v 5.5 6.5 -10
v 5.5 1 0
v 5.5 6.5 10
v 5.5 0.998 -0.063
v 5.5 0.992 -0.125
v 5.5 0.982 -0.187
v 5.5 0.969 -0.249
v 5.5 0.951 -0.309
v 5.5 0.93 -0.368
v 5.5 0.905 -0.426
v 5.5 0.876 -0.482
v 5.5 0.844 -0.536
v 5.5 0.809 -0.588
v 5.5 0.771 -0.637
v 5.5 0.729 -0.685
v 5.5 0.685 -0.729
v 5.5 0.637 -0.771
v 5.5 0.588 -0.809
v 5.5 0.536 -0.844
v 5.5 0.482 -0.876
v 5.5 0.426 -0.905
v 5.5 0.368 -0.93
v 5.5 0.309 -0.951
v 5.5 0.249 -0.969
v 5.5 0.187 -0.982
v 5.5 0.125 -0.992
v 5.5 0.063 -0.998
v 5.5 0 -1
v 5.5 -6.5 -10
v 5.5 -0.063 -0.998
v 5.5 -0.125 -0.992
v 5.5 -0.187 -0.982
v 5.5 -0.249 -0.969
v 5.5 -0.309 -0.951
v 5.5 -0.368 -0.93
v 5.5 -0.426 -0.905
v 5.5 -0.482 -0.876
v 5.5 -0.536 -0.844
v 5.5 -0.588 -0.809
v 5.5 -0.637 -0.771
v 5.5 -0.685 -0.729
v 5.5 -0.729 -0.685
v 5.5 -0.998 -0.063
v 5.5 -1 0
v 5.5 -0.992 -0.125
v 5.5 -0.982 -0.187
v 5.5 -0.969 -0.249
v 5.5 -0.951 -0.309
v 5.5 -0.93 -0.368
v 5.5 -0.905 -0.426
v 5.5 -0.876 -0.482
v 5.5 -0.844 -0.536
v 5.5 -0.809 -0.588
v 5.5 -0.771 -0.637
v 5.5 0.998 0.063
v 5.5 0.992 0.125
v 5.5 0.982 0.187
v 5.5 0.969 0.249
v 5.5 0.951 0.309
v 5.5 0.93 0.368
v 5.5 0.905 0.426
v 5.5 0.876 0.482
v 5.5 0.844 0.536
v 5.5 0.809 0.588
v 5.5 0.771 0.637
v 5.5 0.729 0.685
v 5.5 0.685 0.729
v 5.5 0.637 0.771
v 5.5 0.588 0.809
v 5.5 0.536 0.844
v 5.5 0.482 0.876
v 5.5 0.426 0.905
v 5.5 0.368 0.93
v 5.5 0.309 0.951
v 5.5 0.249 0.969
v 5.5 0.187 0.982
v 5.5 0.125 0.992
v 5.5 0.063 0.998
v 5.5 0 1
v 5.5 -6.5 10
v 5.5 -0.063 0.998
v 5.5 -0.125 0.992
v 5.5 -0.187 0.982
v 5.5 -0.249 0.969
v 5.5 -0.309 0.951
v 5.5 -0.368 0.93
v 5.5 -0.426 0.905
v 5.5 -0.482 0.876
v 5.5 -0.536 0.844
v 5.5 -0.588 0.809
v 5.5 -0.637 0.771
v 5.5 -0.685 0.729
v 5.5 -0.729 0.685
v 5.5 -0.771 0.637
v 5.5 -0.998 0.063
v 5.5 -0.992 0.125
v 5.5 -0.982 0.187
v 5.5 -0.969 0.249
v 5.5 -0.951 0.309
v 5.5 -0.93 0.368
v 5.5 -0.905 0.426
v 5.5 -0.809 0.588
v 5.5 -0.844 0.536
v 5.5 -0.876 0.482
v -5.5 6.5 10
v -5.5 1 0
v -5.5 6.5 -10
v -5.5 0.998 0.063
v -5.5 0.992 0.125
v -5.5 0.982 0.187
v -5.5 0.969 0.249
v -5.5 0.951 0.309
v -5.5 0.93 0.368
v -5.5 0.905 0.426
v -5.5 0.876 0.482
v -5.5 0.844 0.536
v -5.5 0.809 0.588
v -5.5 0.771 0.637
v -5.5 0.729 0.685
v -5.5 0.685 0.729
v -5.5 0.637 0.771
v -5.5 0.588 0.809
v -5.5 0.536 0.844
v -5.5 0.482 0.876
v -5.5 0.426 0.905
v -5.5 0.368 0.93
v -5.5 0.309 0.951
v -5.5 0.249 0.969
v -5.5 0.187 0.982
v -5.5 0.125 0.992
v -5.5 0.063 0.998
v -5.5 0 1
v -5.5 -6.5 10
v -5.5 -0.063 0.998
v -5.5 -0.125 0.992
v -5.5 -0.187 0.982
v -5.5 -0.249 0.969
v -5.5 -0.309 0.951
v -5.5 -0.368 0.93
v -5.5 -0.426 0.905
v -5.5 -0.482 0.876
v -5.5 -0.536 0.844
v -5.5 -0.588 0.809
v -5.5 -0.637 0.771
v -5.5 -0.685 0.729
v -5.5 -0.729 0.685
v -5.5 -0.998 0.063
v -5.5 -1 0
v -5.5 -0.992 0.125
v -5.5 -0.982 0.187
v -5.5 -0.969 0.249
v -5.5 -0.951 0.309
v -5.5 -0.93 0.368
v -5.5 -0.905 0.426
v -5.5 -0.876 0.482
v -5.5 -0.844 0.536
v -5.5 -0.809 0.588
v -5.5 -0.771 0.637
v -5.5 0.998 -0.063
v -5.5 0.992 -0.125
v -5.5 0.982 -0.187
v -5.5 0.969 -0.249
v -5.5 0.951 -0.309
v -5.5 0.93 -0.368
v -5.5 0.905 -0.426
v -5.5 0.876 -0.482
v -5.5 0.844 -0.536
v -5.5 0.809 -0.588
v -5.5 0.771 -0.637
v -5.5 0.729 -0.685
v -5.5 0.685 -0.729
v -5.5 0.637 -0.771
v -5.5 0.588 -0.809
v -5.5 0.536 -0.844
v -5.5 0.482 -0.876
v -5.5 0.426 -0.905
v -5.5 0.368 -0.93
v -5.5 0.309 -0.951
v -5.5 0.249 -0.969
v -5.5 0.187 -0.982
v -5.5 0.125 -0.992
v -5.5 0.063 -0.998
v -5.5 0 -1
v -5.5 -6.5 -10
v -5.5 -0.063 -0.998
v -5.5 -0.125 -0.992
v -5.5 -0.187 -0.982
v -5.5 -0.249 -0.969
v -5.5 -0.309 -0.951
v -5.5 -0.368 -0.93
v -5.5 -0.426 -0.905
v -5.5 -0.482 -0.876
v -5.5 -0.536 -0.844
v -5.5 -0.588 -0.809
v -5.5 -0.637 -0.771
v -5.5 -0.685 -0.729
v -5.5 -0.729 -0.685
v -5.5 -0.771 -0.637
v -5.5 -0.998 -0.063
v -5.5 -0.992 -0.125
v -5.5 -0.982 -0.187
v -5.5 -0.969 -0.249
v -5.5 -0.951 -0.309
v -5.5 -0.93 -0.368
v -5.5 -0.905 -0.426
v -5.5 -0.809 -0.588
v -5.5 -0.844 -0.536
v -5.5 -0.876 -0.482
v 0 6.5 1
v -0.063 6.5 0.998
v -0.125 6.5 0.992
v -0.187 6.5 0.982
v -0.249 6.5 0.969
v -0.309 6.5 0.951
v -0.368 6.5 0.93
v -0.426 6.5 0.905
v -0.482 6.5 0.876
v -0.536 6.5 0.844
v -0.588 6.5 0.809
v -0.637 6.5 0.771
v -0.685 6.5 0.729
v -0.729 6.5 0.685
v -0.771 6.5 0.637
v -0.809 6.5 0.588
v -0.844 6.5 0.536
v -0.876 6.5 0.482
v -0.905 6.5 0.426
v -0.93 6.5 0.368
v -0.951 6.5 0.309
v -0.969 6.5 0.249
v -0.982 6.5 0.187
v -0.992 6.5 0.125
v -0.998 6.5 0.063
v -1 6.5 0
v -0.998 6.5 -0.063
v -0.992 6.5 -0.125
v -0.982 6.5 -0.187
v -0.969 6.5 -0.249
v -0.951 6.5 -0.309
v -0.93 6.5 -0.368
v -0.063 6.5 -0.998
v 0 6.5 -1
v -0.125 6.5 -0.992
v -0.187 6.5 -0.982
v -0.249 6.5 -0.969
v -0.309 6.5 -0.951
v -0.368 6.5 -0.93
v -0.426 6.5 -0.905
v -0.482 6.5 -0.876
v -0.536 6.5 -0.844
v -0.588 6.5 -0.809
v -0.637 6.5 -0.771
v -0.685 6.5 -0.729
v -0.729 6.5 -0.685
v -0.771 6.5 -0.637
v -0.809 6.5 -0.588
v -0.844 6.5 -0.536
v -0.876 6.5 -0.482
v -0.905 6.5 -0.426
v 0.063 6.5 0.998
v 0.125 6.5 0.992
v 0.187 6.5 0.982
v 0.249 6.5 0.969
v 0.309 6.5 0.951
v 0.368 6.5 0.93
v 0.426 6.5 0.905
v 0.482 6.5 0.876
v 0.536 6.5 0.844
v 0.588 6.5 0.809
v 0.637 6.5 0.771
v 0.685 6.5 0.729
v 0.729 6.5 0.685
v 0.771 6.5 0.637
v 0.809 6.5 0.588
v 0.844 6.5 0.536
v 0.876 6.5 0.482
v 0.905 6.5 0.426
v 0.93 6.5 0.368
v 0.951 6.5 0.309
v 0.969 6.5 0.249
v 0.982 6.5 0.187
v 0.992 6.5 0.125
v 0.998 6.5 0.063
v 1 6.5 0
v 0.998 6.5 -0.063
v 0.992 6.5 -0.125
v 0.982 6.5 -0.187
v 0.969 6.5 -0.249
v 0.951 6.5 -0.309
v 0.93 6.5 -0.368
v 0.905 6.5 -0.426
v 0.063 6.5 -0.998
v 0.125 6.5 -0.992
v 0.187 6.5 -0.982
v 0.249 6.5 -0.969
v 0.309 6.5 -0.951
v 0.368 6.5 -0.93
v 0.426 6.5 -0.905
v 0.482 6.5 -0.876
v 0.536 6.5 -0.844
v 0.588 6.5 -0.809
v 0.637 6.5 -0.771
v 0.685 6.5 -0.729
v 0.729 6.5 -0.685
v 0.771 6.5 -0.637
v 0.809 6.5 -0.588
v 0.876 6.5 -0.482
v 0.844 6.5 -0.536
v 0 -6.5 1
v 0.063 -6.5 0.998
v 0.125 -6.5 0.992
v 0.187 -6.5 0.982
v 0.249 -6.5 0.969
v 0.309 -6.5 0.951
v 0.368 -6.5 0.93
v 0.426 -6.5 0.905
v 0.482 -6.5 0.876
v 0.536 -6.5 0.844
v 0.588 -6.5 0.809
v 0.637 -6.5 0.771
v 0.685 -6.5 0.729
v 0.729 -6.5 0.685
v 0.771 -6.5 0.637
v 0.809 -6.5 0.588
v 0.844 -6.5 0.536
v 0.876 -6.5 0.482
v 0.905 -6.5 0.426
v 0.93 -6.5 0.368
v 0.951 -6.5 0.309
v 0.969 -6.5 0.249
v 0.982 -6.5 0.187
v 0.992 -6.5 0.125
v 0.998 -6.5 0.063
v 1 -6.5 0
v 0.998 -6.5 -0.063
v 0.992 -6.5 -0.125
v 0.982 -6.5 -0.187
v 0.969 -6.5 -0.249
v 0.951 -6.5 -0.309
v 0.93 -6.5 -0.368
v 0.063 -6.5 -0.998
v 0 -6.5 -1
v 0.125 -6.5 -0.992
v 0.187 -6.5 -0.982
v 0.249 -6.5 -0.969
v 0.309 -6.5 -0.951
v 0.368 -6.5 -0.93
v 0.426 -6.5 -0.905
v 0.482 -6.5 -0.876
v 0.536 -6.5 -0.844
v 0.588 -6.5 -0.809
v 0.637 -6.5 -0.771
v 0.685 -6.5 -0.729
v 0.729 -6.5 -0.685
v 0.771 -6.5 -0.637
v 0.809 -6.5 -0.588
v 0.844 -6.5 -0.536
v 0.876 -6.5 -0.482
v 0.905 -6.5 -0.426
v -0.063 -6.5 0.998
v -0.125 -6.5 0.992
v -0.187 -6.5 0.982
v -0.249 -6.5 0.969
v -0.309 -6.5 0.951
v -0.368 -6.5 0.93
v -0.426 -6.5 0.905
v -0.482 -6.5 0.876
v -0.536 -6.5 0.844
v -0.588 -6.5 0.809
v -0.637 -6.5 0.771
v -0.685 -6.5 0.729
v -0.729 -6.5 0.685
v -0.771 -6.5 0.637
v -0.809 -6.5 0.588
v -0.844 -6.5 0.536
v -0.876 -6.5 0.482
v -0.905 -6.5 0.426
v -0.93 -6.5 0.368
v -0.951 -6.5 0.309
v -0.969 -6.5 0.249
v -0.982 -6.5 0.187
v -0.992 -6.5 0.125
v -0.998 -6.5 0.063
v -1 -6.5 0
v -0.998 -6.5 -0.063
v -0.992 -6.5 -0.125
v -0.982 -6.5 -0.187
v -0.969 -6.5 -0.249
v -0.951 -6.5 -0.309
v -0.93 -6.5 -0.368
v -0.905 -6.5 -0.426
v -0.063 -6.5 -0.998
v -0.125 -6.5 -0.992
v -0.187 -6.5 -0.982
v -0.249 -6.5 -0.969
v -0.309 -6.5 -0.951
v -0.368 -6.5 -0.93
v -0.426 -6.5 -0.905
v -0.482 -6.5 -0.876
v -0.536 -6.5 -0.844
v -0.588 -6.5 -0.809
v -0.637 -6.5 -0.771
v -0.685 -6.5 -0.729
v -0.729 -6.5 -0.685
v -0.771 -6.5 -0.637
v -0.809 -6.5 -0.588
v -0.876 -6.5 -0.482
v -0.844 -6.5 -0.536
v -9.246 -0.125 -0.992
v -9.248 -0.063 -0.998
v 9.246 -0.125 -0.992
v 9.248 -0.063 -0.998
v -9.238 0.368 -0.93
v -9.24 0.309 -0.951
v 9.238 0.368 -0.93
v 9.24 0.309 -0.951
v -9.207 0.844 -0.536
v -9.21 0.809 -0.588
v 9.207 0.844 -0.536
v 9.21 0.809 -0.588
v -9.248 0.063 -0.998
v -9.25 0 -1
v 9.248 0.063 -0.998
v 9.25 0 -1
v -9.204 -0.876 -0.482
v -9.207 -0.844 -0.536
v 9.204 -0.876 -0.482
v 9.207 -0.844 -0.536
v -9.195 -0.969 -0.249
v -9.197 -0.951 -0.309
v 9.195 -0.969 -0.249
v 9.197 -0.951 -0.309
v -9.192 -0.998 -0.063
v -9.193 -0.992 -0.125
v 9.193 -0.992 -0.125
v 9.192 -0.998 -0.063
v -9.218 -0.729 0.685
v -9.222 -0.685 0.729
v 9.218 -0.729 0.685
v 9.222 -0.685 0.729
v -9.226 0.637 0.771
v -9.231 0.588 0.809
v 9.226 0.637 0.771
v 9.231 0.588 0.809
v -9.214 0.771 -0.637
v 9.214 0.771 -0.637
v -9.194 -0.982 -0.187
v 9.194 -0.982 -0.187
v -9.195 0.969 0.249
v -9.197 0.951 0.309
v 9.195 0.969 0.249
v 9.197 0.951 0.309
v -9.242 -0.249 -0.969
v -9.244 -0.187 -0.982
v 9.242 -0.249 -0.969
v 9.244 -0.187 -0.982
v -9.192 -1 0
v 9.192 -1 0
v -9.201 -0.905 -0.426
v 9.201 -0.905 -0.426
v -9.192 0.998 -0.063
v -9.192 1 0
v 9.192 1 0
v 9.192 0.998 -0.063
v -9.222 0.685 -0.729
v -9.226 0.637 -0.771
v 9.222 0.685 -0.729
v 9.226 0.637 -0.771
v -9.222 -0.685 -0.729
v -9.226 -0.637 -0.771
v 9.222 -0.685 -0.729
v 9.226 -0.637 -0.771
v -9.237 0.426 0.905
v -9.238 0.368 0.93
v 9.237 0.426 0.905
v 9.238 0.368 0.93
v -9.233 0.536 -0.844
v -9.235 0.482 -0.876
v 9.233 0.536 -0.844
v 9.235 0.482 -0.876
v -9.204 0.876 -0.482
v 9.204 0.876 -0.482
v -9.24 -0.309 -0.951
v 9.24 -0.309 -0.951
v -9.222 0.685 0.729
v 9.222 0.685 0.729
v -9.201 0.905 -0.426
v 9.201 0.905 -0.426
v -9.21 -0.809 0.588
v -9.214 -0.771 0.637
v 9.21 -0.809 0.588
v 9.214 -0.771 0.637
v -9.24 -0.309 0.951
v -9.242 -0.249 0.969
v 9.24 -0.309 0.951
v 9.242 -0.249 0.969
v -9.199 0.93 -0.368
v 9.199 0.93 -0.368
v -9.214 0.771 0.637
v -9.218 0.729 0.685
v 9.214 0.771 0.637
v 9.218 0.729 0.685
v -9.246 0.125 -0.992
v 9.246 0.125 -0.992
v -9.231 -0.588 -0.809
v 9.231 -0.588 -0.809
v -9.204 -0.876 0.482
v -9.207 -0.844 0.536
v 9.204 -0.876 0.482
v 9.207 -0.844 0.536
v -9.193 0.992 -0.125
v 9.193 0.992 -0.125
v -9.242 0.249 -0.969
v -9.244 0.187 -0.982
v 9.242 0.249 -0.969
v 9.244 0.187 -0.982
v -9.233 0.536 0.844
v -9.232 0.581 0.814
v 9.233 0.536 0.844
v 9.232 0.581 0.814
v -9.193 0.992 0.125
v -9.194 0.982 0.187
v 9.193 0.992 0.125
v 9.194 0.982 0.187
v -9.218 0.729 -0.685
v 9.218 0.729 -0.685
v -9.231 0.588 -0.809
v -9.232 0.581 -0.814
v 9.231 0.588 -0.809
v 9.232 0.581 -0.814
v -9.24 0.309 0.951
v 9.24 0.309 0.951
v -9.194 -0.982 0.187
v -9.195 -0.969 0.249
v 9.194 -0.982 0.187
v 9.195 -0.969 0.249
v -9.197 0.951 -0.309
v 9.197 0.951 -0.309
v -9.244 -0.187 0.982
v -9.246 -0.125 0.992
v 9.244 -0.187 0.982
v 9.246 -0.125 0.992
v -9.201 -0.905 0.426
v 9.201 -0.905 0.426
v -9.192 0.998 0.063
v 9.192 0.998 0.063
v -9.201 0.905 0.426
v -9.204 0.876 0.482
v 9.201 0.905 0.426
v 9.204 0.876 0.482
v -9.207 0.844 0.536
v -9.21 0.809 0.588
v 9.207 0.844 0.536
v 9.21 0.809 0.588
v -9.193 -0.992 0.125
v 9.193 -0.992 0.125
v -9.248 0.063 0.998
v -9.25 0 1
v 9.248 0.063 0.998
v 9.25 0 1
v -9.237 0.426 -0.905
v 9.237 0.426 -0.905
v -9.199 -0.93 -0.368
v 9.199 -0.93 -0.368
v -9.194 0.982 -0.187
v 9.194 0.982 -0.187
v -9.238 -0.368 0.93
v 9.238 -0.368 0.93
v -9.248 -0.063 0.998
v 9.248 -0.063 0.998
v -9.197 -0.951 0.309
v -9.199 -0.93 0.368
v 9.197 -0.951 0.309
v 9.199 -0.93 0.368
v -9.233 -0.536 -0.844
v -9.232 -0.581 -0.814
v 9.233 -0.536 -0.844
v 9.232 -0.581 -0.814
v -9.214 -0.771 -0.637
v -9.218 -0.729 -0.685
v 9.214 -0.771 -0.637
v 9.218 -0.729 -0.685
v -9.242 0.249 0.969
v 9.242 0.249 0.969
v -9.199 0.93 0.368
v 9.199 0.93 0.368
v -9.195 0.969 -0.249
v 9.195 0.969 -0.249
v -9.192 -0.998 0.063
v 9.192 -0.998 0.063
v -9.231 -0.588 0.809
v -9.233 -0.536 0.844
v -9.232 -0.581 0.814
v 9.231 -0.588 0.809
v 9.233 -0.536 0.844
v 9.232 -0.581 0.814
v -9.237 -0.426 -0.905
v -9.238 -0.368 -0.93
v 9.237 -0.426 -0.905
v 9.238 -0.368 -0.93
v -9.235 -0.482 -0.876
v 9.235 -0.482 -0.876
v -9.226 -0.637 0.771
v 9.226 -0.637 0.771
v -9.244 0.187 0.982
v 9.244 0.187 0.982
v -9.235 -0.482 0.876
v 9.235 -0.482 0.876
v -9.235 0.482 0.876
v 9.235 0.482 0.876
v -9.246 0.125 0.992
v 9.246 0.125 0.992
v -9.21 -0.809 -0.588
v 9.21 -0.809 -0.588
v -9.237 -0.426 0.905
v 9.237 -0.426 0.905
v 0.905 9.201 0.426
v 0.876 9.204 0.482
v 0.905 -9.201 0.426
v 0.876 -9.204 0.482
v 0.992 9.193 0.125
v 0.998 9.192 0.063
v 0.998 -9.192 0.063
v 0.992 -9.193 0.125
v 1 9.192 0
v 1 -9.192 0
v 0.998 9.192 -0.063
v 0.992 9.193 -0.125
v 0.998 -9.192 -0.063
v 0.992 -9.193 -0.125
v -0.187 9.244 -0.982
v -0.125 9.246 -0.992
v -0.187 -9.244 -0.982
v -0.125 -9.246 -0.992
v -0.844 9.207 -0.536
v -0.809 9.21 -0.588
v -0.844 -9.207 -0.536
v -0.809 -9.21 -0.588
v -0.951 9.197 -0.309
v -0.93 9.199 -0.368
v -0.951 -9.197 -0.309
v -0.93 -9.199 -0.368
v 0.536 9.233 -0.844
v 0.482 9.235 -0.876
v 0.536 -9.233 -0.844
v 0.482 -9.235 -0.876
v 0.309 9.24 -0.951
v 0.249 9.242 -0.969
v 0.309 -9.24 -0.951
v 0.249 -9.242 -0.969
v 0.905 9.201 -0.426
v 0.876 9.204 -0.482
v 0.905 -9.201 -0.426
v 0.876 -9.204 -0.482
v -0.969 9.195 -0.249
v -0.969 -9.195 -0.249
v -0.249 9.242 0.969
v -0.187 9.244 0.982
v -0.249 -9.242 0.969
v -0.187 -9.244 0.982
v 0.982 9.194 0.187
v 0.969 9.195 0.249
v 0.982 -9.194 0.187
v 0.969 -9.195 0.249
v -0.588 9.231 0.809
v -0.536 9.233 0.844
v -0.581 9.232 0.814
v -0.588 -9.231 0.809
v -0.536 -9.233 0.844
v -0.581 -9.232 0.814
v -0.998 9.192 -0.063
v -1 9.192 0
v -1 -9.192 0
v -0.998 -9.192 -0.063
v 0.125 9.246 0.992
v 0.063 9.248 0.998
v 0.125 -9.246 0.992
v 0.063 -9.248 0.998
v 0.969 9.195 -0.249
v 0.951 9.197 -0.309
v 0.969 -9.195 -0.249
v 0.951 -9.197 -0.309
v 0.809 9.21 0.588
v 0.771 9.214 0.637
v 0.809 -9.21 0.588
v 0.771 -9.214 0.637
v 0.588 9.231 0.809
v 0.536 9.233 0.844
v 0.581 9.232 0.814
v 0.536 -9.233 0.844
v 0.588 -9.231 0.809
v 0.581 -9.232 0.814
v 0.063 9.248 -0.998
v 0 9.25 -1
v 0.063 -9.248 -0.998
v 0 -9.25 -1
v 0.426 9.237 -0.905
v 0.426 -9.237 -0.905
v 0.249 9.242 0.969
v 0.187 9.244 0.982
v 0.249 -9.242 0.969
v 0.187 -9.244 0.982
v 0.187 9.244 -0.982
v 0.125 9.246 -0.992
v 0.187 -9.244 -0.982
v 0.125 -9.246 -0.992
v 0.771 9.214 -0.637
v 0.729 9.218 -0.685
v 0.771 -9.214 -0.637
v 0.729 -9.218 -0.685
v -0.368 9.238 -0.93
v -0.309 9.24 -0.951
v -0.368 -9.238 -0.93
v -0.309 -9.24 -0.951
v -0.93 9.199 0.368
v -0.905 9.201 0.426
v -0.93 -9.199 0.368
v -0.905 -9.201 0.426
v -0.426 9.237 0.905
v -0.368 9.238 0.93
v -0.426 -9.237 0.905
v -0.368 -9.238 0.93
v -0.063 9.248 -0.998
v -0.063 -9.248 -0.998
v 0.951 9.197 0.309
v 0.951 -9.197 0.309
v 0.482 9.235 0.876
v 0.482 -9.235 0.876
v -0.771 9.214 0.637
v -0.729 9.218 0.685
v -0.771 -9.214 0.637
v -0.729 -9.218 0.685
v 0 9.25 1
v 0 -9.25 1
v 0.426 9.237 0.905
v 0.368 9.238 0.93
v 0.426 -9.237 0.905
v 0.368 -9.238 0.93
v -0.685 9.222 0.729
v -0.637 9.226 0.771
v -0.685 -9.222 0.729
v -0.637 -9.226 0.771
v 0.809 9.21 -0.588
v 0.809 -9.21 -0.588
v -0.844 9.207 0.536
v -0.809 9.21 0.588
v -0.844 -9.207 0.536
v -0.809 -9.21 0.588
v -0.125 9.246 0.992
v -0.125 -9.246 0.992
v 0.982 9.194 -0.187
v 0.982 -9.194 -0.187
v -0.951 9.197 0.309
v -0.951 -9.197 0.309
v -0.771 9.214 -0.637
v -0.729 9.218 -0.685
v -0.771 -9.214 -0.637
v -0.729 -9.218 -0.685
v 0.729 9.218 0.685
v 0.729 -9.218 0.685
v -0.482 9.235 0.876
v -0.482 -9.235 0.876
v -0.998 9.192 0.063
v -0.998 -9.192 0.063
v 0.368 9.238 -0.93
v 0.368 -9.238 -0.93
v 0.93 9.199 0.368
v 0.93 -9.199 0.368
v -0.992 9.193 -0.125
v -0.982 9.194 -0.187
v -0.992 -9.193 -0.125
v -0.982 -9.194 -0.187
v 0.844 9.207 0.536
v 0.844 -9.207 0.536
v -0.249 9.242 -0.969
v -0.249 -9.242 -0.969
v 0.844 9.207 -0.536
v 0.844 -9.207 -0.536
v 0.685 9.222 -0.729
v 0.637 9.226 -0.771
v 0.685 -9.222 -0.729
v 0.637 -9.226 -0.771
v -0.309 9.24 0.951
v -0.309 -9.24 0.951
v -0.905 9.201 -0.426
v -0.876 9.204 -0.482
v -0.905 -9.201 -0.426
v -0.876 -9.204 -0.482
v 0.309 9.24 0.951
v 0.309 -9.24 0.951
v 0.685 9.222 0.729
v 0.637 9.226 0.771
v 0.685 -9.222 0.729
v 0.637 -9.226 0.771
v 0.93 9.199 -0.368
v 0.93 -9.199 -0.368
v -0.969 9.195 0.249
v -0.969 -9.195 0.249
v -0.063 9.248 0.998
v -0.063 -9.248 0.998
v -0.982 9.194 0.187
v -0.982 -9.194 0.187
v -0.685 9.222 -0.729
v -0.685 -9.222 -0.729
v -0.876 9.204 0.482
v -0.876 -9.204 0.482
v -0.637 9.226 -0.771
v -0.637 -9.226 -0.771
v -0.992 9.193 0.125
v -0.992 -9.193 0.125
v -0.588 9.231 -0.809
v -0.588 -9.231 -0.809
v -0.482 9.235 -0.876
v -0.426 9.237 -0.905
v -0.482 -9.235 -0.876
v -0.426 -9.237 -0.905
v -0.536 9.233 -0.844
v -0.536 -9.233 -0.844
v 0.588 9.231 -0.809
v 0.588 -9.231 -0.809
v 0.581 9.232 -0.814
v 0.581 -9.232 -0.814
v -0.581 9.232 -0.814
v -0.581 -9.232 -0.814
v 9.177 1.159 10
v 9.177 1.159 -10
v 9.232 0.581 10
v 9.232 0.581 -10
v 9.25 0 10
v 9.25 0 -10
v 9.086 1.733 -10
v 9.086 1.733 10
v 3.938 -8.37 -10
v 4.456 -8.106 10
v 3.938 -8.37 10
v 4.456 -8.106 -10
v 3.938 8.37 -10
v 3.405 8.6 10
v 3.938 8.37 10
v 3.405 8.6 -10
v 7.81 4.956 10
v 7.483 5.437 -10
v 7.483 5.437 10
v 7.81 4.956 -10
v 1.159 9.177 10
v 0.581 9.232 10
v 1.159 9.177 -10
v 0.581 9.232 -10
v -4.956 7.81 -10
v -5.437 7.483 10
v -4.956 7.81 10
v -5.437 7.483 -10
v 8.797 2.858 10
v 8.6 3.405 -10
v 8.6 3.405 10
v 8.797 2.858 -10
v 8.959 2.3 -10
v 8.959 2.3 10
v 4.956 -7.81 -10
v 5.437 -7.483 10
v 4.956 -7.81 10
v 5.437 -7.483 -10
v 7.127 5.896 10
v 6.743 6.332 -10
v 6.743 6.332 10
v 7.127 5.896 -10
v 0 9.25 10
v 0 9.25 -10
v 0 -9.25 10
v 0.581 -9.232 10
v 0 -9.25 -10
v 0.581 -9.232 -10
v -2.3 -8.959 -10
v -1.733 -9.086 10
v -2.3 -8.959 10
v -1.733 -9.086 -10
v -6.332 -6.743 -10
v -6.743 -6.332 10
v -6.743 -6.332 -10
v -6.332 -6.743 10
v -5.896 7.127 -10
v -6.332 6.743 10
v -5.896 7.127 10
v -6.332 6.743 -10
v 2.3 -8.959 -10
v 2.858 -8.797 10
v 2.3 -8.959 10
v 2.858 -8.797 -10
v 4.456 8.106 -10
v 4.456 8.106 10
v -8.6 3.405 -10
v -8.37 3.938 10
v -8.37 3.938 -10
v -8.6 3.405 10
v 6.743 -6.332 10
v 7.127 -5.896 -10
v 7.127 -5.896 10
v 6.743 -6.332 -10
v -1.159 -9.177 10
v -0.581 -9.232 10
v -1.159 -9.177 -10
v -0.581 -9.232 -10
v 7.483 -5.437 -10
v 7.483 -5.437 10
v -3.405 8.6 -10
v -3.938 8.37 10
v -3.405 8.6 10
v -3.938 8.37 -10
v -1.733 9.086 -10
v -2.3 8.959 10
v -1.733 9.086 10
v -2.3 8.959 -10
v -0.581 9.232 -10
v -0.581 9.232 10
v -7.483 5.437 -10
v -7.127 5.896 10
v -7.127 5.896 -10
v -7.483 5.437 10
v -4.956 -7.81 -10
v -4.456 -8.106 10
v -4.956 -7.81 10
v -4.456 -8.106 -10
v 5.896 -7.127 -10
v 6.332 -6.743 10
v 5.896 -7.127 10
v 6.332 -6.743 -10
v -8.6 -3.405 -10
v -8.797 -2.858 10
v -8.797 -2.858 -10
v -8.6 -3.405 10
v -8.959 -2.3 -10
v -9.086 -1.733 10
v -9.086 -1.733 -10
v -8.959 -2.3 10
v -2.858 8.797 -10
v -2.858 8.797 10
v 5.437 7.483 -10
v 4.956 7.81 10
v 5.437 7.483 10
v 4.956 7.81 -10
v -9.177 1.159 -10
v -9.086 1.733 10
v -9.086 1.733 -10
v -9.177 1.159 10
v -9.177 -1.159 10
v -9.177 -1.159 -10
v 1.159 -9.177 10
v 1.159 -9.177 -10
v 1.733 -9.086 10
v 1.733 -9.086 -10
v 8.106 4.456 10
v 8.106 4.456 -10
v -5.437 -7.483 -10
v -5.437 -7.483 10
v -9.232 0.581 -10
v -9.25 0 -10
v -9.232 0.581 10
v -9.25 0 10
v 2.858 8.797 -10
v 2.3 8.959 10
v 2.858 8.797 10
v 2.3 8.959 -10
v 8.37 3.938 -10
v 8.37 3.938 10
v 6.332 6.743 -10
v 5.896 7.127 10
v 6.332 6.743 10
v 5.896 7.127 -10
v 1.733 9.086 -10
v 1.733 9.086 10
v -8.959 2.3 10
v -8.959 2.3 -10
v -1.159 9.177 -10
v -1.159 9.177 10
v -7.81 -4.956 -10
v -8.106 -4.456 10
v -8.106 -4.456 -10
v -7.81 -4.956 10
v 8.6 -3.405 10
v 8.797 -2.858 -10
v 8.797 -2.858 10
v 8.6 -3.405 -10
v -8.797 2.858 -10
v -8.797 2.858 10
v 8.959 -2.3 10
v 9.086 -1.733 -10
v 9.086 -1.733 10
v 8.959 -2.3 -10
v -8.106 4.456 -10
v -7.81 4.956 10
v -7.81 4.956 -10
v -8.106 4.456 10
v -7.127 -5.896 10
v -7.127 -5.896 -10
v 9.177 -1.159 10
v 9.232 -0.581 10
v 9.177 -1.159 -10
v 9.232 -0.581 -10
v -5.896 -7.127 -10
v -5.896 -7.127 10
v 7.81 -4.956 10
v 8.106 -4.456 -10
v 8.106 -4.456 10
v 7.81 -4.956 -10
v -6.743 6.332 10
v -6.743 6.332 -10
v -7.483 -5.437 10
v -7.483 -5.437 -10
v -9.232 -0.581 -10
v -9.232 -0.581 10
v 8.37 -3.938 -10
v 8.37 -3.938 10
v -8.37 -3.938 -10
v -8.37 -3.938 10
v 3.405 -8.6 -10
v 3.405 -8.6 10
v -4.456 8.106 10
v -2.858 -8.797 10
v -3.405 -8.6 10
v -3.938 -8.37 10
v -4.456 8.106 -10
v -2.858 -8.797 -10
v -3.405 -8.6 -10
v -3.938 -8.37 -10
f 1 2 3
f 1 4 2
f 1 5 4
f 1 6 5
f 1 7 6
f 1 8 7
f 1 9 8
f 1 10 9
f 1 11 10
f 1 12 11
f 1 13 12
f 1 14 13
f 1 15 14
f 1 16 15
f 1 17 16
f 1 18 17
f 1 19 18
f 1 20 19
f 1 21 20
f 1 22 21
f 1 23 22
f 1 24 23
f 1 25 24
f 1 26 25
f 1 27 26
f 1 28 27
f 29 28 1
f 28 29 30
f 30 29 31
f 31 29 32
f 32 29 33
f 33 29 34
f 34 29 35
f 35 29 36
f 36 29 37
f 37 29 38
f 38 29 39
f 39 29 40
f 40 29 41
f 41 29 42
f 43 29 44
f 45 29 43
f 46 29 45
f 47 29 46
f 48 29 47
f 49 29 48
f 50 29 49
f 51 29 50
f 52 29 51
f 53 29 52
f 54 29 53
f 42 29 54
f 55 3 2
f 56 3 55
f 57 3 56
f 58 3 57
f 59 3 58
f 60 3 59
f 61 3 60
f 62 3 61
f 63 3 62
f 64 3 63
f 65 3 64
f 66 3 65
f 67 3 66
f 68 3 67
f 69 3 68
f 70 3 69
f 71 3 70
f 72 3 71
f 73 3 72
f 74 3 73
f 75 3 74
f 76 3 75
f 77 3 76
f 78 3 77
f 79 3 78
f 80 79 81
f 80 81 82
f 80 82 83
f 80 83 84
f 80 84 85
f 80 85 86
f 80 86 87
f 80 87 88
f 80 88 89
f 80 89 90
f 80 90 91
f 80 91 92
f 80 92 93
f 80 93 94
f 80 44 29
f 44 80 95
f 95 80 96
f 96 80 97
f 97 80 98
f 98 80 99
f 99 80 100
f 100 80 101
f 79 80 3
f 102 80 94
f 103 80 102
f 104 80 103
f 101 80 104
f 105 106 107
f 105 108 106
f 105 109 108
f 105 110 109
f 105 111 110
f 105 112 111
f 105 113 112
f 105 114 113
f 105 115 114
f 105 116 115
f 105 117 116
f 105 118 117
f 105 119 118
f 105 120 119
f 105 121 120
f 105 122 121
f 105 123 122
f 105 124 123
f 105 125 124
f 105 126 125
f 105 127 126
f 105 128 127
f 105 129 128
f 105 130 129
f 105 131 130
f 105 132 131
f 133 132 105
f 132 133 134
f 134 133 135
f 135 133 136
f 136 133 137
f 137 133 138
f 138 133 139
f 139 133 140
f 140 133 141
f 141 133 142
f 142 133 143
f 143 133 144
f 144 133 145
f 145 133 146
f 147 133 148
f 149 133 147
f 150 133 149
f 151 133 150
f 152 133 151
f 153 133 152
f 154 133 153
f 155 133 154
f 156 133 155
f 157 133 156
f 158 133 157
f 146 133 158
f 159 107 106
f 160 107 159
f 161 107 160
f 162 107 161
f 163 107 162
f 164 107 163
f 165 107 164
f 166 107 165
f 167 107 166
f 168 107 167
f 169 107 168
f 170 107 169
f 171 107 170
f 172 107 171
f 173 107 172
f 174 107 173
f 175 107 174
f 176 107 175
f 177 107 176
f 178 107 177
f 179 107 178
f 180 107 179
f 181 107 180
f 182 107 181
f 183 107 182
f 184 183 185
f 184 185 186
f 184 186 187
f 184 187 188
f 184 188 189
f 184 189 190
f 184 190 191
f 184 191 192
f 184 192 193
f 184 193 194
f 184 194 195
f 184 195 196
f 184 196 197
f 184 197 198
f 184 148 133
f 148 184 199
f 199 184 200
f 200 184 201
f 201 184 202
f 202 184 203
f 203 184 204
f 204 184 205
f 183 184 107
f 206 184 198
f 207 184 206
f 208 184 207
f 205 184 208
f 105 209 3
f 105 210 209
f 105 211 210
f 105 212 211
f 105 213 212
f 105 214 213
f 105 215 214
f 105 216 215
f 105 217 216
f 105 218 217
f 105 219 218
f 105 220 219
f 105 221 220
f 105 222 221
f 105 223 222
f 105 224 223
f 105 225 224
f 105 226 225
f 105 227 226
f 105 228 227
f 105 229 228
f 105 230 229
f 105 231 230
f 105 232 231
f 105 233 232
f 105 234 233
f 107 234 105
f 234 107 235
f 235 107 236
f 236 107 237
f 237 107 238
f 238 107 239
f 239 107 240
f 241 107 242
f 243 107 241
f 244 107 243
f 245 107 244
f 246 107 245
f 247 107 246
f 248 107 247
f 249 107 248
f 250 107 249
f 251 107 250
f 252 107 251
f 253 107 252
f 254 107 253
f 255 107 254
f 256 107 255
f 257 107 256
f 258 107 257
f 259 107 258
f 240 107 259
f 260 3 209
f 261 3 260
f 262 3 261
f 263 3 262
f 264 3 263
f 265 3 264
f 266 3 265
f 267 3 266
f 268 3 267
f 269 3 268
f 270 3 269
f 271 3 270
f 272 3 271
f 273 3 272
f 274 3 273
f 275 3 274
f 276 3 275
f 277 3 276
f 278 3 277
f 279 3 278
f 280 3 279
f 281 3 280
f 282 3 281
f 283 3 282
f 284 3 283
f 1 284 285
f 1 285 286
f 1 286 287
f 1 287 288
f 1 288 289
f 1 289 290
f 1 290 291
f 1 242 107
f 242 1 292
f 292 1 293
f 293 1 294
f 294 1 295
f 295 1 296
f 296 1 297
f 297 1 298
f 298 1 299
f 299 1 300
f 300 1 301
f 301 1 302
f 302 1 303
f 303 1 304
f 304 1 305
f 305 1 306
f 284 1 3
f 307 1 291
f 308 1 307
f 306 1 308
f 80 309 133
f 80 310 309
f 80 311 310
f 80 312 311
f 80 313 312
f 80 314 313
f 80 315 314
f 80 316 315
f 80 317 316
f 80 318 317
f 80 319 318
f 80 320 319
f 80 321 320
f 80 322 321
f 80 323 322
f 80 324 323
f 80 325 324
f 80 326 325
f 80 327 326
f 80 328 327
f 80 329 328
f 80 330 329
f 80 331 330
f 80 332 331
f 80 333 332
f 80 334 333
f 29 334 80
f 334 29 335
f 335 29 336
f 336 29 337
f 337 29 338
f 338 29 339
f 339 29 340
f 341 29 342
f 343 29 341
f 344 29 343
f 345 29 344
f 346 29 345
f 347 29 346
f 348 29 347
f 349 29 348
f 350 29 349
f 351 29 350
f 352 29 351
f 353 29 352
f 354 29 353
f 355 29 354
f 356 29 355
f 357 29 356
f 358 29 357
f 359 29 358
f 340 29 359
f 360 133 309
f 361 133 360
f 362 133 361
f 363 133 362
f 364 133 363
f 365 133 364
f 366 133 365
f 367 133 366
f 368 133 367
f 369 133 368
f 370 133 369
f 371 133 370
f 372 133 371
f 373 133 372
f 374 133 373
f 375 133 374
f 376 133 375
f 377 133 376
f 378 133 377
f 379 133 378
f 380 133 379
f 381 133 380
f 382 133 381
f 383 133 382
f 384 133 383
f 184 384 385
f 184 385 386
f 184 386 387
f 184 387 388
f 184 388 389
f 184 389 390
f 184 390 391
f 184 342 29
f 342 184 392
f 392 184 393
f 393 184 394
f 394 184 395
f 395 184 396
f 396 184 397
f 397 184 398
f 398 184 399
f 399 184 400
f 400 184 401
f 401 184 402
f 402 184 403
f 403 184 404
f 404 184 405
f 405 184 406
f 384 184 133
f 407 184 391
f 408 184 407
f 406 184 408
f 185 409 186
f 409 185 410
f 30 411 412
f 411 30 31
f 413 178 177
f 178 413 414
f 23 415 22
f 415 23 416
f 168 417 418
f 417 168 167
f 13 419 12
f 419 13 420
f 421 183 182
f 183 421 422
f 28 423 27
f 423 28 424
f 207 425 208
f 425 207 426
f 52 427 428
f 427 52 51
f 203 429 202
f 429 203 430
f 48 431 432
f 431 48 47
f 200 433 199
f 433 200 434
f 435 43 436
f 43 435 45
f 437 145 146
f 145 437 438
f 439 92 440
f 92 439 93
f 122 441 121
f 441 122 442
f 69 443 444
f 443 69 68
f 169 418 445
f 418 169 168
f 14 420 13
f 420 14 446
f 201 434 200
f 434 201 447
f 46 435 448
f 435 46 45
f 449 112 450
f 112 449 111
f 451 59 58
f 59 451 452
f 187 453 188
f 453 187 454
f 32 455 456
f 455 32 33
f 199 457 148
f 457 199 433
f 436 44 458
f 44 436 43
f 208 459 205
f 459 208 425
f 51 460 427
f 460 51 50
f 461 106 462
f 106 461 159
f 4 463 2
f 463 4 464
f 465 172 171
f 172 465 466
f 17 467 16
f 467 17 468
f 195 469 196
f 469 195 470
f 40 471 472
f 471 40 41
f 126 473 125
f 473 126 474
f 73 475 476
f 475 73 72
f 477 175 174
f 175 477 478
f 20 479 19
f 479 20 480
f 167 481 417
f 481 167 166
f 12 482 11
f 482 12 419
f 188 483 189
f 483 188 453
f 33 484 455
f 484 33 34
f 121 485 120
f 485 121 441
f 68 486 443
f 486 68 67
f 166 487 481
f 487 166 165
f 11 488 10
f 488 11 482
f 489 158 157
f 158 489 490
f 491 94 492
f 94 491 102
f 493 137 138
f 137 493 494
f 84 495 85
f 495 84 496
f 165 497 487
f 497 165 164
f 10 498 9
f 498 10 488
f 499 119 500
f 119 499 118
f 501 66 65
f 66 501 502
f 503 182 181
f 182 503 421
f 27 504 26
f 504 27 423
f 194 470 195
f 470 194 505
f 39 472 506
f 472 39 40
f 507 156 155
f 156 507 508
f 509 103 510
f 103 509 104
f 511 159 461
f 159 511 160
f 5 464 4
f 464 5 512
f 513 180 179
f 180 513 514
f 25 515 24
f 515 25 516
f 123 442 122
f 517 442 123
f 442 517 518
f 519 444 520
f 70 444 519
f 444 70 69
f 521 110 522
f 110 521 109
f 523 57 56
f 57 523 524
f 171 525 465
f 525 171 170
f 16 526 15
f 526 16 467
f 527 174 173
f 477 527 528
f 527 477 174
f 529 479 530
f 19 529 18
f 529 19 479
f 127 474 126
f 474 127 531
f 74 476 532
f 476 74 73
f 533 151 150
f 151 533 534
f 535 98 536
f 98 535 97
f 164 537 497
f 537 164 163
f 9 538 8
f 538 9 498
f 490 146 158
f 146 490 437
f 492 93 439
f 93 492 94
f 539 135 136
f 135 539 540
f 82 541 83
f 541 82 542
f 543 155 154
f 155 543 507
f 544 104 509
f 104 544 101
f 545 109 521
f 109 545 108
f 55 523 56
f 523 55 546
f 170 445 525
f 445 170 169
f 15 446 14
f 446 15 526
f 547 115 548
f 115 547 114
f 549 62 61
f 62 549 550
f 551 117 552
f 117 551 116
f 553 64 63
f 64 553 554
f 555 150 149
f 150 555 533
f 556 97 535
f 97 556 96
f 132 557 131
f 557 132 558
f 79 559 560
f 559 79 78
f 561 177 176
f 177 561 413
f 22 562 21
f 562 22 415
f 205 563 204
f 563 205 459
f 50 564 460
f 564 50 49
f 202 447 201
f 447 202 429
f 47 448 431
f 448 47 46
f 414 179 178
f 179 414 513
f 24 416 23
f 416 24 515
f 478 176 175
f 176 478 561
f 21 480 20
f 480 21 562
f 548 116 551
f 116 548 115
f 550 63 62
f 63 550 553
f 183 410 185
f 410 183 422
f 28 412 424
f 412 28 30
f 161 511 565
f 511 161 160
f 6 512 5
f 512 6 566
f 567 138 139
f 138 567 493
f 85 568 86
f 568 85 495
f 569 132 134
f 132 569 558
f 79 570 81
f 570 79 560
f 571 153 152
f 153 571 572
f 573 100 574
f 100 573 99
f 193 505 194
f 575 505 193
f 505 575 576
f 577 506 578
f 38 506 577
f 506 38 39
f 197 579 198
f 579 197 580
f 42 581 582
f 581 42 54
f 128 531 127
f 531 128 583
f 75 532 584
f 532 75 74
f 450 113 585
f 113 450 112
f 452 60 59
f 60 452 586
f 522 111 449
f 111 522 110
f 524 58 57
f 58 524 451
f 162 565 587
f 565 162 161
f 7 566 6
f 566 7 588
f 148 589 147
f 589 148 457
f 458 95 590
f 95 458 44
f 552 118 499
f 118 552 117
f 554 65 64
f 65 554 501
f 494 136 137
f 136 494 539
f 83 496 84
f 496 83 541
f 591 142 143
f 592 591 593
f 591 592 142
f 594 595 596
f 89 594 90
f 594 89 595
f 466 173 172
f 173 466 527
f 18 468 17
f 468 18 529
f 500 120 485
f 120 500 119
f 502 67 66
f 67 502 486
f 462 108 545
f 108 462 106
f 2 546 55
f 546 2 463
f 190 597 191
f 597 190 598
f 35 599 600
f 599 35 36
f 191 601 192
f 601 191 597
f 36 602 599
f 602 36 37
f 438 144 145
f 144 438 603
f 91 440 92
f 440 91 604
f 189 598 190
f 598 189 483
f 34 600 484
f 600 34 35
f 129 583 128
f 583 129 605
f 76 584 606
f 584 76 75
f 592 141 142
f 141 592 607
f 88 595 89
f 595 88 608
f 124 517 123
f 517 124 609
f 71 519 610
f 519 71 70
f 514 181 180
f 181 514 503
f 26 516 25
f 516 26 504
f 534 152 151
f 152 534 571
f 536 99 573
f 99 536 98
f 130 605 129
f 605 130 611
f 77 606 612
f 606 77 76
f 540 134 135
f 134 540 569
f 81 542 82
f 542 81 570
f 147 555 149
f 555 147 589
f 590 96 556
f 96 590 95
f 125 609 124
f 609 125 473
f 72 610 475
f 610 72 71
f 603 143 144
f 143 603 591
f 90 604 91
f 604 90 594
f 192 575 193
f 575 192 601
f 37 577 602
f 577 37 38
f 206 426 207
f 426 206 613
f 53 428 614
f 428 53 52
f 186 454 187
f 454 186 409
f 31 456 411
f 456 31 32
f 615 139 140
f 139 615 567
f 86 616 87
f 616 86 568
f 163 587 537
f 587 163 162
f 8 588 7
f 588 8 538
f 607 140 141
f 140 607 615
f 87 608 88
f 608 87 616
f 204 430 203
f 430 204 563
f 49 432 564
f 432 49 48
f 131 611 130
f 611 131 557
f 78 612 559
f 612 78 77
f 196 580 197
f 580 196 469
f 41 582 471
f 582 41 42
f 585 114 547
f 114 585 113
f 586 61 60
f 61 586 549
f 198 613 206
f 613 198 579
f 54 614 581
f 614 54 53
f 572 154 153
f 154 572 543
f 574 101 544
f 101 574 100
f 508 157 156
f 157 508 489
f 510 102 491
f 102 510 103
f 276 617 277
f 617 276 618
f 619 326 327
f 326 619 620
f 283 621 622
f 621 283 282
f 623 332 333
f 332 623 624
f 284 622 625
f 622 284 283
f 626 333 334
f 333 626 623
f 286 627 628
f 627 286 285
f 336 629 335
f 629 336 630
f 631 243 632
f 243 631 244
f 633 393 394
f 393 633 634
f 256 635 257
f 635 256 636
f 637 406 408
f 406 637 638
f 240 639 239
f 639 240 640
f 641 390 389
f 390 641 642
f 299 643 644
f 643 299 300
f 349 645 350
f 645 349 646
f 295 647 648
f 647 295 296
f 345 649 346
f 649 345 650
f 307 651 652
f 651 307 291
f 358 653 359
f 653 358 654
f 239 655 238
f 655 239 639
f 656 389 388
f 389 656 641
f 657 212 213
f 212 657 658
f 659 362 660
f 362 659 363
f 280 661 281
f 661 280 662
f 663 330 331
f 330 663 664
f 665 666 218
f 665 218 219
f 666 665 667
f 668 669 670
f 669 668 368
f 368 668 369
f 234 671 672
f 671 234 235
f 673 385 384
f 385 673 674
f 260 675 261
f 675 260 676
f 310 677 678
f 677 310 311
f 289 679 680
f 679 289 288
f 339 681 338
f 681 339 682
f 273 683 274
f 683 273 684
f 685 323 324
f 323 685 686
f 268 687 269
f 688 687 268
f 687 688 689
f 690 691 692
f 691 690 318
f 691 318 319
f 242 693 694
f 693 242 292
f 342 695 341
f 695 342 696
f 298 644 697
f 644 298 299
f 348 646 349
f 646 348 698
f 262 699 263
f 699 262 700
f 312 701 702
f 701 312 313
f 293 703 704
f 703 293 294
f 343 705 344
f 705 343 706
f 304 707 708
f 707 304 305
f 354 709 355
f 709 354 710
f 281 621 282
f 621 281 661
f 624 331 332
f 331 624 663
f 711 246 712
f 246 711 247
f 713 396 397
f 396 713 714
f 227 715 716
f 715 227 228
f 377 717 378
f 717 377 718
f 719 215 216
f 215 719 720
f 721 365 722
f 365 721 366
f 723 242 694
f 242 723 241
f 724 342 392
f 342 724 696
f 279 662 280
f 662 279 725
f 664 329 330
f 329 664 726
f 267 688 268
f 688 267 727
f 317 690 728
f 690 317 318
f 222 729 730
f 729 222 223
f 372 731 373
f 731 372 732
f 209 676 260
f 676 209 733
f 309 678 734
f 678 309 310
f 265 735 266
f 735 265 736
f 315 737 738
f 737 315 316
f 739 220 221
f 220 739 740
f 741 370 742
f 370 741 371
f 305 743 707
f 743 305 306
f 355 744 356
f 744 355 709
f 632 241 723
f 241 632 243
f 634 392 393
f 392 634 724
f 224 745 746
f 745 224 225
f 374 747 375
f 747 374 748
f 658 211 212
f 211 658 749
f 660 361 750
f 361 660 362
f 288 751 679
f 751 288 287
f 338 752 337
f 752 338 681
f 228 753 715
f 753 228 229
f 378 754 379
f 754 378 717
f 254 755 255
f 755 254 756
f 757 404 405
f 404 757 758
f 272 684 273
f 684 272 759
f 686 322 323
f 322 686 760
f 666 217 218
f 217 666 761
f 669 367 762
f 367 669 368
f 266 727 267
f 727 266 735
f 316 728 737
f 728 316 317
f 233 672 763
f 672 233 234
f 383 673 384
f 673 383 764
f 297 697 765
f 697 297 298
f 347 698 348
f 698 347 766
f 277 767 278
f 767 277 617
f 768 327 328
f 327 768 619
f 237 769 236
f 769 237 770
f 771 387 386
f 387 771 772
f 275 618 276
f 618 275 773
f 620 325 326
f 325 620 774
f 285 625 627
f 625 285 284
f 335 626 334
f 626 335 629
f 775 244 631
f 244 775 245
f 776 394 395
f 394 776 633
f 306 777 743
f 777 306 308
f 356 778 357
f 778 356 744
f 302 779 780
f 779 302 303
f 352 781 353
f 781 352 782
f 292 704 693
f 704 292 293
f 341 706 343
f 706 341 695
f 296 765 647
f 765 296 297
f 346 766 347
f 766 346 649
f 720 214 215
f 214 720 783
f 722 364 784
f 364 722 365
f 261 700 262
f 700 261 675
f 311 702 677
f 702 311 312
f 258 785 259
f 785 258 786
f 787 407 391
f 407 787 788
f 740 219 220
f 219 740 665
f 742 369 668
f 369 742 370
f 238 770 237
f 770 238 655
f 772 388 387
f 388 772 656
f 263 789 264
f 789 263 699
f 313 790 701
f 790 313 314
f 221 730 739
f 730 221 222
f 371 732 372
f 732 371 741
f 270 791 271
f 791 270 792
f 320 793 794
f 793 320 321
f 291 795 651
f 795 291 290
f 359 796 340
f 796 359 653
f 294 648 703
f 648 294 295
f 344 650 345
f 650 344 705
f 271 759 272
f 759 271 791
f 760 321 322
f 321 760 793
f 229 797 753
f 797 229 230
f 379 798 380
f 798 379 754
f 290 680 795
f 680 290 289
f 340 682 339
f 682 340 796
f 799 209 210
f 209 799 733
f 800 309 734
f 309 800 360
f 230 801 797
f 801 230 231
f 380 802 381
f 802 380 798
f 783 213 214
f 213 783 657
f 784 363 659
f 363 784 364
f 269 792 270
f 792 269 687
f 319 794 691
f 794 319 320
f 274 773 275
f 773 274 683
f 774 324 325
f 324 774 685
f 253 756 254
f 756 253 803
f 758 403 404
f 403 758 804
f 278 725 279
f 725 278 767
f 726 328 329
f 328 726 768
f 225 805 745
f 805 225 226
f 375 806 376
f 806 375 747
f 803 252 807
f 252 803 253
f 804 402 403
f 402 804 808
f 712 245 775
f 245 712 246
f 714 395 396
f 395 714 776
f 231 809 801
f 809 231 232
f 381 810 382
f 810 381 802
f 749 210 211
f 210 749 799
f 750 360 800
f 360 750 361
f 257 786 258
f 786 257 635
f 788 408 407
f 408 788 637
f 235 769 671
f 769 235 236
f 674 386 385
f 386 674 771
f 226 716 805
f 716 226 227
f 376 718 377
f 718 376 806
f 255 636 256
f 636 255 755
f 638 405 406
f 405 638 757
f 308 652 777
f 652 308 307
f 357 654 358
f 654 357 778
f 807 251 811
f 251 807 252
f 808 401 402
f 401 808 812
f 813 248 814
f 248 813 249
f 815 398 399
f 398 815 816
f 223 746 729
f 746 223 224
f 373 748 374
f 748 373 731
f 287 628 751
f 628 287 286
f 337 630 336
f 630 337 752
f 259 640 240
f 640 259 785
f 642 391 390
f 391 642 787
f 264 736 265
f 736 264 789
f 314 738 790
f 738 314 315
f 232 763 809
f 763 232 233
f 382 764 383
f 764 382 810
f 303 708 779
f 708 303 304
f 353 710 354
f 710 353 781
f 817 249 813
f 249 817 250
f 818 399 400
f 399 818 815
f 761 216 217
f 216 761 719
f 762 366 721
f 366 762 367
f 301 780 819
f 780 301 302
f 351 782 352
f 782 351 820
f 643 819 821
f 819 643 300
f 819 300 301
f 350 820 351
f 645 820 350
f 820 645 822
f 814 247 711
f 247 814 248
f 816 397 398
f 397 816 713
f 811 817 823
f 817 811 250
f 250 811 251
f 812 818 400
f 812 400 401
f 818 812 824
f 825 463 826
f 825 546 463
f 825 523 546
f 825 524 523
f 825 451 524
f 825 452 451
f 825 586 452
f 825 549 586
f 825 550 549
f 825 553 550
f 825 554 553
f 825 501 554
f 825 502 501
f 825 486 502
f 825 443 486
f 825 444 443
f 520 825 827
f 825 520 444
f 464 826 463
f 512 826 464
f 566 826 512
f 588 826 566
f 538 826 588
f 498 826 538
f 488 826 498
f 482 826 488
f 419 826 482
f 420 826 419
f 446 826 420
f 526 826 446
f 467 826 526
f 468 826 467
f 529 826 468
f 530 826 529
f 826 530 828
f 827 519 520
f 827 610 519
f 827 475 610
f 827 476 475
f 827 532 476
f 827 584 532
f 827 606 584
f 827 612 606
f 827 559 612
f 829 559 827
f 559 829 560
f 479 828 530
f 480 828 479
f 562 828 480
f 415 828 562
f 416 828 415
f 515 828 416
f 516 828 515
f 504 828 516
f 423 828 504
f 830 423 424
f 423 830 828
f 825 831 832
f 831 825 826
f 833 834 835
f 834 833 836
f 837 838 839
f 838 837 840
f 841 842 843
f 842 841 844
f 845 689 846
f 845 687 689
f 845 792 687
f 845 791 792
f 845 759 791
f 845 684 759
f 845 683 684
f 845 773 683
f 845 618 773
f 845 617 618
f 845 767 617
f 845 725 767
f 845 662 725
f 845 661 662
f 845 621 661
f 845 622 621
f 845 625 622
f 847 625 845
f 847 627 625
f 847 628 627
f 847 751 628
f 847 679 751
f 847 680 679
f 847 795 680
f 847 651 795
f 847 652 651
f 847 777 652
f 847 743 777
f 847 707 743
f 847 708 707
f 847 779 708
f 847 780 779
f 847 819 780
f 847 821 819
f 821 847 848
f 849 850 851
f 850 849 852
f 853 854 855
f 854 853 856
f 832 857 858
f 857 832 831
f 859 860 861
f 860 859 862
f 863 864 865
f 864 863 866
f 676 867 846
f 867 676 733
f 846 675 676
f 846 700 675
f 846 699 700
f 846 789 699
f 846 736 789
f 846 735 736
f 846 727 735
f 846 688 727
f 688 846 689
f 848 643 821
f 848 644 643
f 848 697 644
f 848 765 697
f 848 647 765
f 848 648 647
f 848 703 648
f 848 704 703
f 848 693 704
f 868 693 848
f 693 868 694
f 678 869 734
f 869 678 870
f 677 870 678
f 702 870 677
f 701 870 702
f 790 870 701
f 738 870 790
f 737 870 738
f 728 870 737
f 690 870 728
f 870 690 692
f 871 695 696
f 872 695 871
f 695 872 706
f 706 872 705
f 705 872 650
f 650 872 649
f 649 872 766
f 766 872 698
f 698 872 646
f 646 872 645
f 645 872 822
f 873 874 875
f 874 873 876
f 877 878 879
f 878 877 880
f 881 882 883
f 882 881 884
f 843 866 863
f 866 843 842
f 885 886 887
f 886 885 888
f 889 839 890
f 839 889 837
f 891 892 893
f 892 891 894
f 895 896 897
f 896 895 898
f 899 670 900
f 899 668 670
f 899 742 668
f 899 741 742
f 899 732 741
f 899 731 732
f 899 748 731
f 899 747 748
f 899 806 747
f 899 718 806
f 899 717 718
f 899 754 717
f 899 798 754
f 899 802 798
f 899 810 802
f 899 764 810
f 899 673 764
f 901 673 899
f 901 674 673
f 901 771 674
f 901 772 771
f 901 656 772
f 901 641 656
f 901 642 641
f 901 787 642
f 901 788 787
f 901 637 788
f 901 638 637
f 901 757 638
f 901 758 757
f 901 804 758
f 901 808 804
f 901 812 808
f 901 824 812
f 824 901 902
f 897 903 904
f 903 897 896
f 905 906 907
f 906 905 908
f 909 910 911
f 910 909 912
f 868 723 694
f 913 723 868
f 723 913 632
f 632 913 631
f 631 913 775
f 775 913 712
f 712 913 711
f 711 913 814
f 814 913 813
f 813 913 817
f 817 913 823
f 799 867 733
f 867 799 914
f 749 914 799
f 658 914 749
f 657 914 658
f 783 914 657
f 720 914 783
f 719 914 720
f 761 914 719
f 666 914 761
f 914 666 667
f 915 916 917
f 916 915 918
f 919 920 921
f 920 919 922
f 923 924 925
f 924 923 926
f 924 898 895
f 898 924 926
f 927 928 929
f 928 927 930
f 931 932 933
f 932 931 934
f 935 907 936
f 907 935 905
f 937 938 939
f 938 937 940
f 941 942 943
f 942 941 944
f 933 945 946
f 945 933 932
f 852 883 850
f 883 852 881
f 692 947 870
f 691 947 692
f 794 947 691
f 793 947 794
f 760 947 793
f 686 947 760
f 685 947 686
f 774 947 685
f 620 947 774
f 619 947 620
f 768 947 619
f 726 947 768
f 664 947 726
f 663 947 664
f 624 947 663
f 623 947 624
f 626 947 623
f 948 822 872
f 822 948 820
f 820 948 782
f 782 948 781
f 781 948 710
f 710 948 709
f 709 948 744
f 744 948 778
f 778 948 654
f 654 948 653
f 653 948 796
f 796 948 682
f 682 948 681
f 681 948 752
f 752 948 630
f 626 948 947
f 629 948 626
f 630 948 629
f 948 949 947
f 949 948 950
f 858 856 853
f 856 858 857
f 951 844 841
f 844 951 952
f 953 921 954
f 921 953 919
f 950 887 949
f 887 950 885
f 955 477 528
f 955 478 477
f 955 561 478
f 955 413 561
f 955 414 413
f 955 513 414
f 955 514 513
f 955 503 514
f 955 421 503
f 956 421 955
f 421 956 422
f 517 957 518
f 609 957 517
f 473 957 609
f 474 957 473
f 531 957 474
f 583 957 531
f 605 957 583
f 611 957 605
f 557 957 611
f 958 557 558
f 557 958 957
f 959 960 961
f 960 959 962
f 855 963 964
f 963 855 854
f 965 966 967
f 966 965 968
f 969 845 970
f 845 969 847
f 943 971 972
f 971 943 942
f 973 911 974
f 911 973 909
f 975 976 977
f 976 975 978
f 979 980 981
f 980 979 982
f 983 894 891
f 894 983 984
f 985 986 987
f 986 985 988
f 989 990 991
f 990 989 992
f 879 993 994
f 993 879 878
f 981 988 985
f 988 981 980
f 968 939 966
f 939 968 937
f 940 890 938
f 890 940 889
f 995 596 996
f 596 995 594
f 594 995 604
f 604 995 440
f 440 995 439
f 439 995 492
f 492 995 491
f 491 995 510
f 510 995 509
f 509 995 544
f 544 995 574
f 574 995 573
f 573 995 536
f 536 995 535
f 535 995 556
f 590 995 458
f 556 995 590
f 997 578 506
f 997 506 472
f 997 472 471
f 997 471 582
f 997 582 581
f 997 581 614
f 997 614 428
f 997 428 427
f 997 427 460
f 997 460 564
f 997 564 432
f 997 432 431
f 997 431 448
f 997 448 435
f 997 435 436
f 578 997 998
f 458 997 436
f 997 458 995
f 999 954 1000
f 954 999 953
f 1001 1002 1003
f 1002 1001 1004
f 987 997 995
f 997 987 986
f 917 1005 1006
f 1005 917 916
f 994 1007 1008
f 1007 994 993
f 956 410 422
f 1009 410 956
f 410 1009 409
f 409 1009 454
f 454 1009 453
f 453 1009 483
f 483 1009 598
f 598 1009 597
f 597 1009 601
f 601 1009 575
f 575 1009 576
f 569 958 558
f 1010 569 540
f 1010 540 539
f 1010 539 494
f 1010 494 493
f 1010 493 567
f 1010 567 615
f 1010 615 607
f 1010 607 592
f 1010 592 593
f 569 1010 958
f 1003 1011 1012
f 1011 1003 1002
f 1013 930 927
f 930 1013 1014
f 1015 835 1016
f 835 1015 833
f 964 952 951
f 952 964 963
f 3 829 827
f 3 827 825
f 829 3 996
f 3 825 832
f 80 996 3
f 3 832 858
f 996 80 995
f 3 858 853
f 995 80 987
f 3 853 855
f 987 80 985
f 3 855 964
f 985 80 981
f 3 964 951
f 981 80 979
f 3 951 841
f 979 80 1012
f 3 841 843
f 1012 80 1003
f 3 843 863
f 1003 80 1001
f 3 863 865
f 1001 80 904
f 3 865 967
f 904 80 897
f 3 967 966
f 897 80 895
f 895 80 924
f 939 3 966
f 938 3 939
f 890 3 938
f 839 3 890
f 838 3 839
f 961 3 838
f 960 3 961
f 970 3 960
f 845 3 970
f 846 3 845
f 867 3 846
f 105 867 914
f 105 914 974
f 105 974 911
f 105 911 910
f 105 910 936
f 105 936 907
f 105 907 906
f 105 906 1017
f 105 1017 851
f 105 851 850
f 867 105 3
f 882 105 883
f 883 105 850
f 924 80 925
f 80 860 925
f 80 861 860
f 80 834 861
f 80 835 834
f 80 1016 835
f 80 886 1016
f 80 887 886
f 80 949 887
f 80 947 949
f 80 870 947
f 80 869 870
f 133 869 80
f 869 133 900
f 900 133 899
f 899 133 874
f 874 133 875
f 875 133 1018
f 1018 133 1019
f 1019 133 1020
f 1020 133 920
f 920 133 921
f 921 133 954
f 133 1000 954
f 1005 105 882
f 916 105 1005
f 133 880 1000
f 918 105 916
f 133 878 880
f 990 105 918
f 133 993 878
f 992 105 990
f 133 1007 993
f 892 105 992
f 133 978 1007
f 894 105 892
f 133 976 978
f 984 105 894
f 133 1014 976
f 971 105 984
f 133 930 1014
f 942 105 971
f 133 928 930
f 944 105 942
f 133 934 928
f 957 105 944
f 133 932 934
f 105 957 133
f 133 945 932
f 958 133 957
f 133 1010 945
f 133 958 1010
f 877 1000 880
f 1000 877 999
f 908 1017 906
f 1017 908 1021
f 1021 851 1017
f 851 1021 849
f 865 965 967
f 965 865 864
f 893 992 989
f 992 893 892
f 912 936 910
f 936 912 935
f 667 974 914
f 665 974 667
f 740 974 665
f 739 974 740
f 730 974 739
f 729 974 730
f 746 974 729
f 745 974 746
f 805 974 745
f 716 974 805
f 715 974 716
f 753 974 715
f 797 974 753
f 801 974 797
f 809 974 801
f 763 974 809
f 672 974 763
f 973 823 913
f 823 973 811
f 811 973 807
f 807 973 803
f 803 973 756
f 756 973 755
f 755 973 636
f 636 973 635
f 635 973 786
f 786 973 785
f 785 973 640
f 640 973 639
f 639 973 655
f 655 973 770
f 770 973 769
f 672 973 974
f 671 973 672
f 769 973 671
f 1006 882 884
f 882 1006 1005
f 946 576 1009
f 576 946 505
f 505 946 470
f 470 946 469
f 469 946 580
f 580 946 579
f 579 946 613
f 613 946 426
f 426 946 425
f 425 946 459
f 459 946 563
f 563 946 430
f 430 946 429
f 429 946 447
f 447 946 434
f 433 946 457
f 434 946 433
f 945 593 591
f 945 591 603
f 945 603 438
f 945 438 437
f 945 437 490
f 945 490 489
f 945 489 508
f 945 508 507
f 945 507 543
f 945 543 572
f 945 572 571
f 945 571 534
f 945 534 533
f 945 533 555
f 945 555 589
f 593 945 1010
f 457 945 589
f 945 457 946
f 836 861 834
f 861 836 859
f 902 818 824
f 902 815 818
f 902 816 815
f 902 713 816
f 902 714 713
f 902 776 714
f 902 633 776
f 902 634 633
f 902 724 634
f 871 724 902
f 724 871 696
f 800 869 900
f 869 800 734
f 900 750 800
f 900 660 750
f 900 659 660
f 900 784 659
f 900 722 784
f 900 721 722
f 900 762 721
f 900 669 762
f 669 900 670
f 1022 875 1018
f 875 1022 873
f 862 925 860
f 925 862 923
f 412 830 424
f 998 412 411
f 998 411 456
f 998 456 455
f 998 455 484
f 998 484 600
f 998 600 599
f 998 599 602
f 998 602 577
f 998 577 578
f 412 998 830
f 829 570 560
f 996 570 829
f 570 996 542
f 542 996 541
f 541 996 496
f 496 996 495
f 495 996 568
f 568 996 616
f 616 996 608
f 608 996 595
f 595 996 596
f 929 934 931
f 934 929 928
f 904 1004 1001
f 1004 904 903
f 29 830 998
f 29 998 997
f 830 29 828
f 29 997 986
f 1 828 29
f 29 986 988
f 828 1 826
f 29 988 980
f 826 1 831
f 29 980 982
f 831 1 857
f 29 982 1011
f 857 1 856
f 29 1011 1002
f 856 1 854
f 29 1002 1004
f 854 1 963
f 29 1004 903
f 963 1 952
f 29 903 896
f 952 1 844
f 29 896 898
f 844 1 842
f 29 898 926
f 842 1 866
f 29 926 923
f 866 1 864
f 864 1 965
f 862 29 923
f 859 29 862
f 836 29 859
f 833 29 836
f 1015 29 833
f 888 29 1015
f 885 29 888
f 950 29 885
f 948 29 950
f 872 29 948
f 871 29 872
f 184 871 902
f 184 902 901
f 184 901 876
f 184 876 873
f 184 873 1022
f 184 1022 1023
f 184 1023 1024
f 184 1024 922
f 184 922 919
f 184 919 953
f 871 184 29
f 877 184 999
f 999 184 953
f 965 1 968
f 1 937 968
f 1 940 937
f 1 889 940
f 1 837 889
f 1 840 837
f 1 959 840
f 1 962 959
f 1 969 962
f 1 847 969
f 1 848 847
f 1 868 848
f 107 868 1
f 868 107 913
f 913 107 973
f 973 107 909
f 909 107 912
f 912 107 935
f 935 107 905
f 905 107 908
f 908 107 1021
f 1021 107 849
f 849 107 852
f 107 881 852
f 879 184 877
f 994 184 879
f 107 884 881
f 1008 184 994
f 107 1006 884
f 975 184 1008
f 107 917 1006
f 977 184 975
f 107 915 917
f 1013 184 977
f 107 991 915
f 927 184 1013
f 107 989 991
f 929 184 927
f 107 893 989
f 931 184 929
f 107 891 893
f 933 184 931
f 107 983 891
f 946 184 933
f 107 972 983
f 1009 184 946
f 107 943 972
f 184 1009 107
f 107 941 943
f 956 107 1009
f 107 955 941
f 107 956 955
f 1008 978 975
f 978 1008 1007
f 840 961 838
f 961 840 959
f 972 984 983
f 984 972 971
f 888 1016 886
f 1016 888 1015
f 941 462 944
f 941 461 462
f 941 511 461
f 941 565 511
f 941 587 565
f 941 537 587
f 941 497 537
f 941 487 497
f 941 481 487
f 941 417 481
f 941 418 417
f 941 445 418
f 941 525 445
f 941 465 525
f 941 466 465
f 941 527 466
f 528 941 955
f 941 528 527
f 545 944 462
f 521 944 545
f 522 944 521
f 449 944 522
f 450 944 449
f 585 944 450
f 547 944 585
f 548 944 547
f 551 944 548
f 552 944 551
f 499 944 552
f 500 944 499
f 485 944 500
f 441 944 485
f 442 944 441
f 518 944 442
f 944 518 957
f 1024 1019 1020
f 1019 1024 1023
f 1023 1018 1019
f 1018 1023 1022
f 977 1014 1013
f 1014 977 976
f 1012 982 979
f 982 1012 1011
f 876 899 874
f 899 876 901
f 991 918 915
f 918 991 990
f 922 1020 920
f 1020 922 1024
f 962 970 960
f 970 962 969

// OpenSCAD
difference(){
	union(){
        
       translate([0,0,0]){
            rotate(a = [0,0,0]) {
                cylinder(h=20, r=9.25, $fn=100, center=true);
            }
       }
	}
	union() {
        
       translate([0,0,0]){
           cube([11,13,100], center=true);
       }
       translate([0,0,0]){
            rotate(a = [0,90,0]) {
                cylinder(h=600, r=1, $fn=100, center=true);
            }
       }			   
       translate([0,0,0]){
            rotate(a = [90,0,0]) {
                cylinder(h=600, r=1, $fn=100, center=true);
            }
       }			   

        
	}
}
